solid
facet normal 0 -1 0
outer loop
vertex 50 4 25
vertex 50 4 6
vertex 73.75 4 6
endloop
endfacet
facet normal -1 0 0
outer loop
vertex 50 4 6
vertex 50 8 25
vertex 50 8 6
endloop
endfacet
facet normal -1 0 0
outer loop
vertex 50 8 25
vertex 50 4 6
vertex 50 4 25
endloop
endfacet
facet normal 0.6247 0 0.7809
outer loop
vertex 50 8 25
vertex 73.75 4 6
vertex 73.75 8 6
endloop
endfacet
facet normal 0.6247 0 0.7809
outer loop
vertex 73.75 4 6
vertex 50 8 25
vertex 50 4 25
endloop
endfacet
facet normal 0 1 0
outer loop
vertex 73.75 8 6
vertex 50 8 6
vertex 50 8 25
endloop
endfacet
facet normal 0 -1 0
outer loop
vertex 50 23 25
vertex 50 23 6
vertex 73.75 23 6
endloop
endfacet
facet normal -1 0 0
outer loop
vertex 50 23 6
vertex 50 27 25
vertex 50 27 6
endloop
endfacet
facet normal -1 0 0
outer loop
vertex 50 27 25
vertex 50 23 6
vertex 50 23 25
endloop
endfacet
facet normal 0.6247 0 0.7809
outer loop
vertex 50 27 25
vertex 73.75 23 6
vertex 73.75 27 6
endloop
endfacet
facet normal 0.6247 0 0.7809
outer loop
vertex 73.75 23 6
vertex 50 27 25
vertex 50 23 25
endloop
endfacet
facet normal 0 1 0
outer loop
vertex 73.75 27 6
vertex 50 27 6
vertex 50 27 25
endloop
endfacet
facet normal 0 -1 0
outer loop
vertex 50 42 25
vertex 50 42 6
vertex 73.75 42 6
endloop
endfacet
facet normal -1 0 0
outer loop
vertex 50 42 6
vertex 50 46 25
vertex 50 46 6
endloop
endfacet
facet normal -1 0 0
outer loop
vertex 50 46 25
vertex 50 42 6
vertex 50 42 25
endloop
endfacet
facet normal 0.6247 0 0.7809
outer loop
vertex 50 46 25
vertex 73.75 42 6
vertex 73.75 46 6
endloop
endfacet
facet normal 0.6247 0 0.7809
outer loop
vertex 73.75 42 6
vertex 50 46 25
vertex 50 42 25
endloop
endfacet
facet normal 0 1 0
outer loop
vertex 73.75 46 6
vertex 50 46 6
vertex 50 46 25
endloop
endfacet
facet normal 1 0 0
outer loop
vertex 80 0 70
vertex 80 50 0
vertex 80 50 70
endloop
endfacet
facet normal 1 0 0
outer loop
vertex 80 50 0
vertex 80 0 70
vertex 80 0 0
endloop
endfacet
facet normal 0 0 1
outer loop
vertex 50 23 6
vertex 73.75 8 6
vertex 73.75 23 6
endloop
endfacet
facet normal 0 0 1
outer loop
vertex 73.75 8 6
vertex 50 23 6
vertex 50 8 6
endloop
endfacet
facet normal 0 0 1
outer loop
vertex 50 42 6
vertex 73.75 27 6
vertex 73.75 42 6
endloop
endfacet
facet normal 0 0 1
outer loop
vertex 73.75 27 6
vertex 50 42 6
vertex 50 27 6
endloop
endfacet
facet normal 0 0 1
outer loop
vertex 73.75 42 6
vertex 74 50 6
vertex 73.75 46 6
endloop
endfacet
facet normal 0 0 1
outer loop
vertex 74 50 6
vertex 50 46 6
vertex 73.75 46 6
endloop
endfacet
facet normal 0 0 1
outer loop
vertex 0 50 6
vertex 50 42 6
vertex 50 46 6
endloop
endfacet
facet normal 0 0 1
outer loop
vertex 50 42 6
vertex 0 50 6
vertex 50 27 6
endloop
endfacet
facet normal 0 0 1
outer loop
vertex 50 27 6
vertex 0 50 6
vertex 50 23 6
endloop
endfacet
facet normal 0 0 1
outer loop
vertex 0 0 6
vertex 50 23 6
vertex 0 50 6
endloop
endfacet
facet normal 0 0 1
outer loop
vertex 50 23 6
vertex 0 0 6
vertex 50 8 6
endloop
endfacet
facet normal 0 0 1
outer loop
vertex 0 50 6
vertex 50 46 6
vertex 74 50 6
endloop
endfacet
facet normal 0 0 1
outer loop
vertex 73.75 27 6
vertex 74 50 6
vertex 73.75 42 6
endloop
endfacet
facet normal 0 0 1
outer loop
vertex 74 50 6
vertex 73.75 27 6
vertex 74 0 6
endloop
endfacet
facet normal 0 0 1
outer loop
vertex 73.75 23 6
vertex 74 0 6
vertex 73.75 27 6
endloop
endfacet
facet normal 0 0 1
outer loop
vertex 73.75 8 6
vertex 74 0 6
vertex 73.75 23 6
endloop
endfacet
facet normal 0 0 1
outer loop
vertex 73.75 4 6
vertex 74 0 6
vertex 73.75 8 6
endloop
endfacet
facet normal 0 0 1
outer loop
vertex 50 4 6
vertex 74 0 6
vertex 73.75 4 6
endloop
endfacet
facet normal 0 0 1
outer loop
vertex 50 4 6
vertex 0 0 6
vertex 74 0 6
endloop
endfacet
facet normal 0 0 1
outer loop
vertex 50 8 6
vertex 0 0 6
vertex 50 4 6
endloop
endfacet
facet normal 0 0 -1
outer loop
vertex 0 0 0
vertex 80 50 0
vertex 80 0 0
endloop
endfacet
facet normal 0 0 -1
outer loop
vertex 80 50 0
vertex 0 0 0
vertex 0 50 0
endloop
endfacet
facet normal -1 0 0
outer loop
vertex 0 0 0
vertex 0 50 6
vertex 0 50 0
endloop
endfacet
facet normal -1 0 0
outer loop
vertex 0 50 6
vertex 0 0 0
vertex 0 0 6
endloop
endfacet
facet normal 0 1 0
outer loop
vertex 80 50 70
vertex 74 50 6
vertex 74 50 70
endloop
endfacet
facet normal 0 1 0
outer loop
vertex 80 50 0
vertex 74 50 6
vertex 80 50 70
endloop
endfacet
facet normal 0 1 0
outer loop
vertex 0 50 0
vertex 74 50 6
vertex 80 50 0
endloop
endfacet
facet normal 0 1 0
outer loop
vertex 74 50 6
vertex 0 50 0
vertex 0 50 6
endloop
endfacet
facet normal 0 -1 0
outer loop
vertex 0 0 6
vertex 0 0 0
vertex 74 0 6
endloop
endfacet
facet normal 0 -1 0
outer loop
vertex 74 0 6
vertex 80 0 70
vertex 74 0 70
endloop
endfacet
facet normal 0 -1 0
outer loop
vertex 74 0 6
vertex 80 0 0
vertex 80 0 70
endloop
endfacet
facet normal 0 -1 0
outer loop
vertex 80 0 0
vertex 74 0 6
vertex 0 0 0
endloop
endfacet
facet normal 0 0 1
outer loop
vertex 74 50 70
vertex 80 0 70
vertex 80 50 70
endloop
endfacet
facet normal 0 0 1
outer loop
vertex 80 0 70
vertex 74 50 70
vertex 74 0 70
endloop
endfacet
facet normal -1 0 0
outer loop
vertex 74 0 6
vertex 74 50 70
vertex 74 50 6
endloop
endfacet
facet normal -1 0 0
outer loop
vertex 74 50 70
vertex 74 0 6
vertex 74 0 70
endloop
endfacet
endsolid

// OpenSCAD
$fn = 32;

// ----------------------------------------------------------------------
// Rib bracket: 3-gusset L bracket
// ----------------------------------------------------------------------

// --- parameters (mm) ---
base_l = 80;              // foot length, X
base_w = 50;              // foot width, Y
base_t = 6;               // foot thickness
plate_t = 6;              // upright plate thickness
plate_h = 70;             // overall height
gus_l = 24;               // gusset leg along the foot
gus_h = 20;               // gusset height
gus_t = 4;                // gusset thickness
gus_edge = 4;             // gusset margin from the foot edge
n_gus = 3;                // gusset count

gus_pitch = (base_w - 2 * gus_edge - gus_t) / (n_gus - 1);  // gusset pitch

union() {
  cube([base_l, base_w, base_t]);
  translate([base_l - plate_t, 0, base_t - 1])
    cube([plate_t, base_w, plate_h - base_t + 1]);
  for (i = [0 : n_gus - 1])
    translate([base_l - plate_t - gus_l, gus_edge + i * gus_pitch, base_t - 1])
      rotate([-90, 0, 0])
        linear_extrude(height = gus_t)
          polygon(points = [[0, 0], [gus_l + 1, 0], [0, -gus_h]]);
}
